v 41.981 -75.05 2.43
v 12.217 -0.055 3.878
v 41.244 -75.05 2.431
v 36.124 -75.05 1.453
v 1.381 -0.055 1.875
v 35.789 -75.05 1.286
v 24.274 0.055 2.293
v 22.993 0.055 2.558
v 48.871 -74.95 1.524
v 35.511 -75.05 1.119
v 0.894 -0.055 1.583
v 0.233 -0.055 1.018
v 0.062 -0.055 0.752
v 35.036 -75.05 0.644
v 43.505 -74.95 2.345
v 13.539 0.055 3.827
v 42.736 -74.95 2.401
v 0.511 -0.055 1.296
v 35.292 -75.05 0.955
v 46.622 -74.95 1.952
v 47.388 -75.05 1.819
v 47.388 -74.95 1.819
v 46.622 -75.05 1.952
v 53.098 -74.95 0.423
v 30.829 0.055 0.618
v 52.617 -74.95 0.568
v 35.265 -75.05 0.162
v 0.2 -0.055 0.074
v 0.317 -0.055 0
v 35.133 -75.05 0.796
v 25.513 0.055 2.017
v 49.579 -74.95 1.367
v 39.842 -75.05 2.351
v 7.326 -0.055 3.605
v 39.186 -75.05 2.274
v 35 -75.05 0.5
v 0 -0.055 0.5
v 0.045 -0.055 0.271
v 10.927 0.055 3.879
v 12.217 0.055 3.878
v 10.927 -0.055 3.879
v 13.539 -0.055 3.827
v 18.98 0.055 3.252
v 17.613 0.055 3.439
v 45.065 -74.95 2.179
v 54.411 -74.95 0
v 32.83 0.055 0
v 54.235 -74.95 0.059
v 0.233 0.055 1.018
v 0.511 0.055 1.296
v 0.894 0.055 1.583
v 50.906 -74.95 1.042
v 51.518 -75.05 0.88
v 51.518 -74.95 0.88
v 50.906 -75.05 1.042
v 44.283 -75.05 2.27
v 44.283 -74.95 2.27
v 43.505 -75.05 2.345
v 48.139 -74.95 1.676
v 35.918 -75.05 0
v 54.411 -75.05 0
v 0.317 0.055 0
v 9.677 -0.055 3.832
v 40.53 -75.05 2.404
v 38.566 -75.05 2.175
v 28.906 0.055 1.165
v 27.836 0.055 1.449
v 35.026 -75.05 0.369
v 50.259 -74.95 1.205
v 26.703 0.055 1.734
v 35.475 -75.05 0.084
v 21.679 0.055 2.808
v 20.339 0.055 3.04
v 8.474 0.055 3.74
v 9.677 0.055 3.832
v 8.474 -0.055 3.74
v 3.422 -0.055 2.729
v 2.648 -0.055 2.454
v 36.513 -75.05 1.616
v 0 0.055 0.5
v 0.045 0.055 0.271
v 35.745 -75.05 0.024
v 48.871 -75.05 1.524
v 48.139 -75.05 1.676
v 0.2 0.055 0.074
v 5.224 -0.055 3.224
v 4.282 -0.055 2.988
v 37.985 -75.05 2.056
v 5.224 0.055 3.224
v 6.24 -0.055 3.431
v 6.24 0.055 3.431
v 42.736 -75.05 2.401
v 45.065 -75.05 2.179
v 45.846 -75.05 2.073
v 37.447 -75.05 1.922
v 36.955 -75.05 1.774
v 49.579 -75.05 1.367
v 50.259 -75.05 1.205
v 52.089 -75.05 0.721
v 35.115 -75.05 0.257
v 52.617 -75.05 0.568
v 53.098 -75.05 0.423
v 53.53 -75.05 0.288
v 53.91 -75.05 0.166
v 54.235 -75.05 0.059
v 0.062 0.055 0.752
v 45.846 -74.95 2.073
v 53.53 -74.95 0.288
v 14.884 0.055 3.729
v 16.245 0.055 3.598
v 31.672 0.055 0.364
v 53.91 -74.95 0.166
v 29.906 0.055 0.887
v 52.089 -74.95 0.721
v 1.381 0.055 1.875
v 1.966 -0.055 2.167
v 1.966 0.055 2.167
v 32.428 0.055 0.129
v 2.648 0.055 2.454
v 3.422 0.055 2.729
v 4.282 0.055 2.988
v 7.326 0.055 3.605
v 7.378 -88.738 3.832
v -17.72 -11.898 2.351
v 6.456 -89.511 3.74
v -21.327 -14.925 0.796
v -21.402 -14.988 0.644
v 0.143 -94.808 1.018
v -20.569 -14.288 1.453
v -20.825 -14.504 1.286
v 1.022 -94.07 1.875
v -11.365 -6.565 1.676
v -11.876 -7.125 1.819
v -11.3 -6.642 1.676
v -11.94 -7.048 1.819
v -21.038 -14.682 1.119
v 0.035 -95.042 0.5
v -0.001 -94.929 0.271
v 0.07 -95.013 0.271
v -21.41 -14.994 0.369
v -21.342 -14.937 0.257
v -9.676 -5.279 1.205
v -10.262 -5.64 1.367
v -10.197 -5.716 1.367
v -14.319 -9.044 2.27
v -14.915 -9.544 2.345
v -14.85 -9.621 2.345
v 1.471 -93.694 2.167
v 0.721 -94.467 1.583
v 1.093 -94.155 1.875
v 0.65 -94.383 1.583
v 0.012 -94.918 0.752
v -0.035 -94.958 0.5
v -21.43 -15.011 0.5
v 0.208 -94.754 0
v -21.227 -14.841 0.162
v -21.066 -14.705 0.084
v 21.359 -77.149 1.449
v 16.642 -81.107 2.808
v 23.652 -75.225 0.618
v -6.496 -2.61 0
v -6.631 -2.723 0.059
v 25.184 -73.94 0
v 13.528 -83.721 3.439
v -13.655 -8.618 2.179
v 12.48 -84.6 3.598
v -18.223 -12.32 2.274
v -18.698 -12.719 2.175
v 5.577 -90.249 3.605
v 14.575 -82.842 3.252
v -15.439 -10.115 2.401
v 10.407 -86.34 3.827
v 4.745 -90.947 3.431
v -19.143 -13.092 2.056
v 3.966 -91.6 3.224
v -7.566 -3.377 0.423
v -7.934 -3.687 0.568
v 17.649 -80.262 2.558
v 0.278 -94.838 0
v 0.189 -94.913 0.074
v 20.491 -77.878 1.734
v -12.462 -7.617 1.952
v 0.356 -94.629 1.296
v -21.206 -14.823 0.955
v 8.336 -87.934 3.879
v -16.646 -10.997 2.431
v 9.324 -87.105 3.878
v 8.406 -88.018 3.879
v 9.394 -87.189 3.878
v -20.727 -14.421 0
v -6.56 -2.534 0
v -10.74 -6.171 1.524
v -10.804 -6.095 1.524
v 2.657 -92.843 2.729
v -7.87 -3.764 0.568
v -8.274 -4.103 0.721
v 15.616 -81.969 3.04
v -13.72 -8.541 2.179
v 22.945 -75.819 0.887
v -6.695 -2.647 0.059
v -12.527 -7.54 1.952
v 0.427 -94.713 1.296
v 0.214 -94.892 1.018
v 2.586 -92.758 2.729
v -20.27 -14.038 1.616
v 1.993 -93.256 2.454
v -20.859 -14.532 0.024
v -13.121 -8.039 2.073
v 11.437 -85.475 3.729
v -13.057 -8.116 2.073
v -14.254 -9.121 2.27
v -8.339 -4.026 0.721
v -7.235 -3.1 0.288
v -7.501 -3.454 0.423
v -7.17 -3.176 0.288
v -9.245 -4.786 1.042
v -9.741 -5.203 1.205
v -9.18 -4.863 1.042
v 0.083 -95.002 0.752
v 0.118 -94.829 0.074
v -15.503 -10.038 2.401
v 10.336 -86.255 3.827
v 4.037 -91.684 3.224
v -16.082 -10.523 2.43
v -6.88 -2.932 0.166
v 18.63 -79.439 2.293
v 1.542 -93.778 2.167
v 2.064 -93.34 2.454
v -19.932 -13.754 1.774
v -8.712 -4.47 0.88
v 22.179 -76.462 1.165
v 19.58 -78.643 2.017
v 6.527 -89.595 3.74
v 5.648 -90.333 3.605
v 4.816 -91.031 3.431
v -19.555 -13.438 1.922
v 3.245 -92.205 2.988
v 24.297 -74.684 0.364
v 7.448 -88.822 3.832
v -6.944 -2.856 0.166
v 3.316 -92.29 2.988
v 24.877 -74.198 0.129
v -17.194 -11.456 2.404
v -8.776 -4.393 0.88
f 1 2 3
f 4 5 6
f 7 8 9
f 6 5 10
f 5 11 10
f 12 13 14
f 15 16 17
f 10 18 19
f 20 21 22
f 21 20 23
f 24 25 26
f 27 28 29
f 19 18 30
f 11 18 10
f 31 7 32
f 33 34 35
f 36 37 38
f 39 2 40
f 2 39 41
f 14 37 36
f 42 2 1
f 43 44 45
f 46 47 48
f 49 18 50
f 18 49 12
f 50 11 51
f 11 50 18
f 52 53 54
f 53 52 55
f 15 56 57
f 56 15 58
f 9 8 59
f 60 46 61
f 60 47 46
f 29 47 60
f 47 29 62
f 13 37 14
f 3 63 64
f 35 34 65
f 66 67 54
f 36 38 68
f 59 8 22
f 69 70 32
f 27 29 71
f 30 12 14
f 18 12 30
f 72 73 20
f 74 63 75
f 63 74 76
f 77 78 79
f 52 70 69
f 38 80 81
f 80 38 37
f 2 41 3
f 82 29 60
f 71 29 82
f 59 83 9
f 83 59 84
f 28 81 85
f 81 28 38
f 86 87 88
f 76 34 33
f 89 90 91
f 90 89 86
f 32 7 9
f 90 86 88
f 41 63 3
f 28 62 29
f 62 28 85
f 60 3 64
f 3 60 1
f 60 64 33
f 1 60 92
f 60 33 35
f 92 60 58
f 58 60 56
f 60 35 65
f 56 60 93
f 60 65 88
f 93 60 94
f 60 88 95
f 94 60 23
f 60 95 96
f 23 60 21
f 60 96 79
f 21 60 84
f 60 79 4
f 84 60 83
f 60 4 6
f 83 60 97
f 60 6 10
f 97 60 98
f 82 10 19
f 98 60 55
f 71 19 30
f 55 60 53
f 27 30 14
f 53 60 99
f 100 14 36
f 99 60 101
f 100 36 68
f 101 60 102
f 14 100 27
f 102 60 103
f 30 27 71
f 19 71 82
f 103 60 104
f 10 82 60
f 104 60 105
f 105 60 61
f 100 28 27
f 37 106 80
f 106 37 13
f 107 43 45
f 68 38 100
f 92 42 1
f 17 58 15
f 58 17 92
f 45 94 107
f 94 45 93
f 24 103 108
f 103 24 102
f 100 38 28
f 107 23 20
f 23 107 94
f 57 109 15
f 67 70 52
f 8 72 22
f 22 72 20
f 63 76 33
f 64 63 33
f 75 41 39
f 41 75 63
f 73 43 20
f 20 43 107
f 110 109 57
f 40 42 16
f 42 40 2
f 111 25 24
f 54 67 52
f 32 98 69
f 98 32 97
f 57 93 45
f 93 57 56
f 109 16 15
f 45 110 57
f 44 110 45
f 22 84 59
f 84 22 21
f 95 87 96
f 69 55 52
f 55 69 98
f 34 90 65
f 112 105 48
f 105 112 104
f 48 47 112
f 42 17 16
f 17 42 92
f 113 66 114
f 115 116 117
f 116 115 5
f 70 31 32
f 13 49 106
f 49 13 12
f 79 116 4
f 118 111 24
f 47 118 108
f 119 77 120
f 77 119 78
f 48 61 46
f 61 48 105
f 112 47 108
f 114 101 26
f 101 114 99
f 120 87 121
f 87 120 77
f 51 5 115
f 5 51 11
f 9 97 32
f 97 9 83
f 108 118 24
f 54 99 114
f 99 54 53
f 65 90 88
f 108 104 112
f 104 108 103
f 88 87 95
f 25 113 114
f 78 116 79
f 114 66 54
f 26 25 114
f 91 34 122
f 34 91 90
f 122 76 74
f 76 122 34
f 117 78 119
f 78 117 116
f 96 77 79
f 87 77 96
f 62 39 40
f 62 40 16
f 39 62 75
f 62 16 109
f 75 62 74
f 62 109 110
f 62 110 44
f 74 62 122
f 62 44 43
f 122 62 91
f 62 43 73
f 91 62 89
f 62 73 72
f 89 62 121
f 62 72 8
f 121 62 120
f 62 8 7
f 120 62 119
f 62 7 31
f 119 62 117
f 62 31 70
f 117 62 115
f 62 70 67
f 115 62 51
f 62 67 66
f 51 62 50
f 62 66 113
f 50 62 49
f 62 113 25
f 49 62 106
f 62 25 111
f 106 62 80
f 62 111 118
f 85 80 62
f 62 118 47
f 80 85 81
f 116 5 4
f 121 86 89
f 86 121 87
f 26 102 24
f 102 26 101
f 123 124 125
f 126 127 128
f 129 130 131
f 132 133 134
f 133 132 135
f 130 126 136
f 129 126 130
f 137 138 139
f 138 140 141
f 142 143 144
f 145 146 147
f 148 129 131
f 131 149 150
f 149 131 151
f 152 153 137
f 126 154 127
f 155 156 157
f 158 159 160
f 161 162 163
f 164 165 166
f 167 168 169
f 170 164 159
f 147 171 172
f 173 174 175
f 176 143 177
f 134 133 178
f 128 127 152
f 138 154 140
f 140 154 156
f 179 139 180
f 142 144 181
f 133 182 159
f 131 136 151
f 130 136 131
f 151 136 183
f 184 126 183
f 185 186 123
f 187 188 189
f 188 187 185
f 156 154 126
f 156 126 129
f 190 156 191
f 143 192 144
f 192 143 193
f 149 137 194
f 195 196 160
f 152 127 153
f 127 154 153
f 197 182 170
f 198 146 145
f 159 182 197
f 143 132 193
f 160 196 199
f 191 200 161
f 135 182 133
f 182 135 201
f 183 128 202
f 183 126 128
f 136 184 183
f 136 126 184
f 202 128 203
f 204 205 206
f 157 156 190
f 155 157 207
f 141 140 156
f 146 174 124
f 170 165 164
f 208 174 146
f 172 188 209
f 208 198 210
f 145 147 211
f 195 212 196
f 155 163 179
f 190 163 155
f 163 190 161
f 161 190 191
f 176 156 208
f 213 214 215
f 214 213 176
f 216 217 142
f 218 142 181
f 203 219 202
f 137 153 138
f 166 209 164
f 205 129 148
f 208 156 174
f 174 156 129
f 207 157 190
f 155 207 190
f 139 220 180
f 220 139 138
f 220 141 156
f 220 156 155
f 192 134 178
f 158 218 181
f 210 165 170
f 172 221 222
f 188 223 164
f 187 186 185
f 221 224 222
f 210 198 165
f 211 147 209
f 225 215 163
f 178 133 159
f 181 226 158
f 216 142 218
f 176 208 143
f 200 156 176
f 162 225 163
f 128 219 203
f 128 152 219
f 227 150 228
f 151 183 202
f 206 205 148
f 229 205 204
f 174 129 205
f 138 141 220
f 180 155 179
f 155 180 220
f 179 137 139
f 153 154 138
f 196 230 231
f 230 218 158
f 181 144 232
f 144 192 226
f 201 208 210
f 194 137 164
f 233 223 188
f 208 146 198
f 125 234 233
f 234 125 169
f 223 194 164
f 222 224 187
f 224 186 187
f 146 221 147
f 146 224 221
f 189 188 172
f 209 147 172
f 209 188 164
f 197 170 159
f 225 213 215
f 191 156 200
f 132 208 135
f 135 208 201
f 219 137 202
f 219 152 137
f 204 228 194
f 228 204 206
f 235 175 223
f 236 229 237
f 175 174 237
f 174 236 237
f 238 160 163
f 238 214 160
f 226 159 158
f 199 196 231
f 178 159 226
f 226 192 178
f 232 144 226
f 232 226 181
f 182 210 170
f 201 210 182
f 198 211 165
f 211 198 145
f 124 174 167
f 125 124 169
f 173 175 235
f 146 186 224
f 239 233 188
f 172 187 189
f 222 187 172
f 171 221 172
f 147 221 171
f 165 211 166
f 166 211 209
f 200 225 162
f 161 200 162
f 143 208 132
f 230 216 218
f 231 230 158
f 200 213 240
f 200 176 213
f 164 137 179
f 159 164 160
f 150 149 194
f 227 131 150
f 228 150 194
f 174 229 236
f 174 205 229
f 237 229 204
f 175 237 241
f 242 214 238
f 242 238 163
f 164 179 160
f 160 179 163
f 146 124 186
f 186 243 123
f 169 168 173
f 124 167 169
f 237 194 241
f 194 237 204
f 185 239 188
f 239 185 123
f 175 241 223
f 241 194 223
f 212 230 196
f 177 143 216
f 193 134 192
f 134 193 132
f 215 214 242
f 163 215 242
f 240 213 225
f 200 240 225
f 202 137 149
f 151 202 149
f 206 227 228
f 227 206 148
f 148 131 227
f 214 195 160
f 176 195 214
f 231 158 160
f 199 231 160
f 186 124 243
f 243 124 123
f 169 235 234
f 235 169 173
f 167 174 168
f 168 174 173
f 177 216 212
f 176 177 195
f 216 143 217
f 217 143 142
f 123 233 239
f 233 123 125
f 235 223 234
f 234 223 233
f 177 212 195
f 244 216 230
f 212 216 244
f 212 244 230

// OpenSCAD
// file: glider.scad
/*
	Openscad glider.

    Copyright (C) Tim Molteno, tim@molteno.net

    
    This program is free software: you can redistribute it and/or modify
    it under the terms of the GNU General Public License as published by
    the Free Software Foundation, either version 3 of the License, or
    (at your option) any later version.

    This program is distributed in the hope that it will be useful,
    but WITHOUT ANY WARRANTY; without even the implied warranty of
    MERCHANTABILITY or FITNESS FOR A PARTICULAR PURPOSE.  See the
    GNU General Public License for more details.

    You should have received a copy of the GNU General Public License
    along with this program.  If not, see <http://www.gnu.org/licenses/>.
*/

/* NACA 5412 Airfoil M=5.0% P=40.0% T=12.0% */

module airfoil(s) {
rotate([0,0,-2]) scale([s,s,s]) polygon(points=[
 [1.000000,-0.000000], [0.998459, 0.000480], [0.993844, 0.001912], [0.986185, 0.004266],
 [0.975528, 0.007497], [0.961940, 0.011541], [0.945503, 0.016321], [0.926320, 0.021747],
 [0.904508, 0.027720], [0.880203, 0.034131], [0.853553, 0.040868], [0.824724, 0.047815],
 [0.793893, 0.054856], [0.761249, 0.061875], [0.726995, 0.068760], [0.691342, 0.075399],
 [0.654508, 0.081690], [0.616723, 0.087531], [0.578217, 0.092831], [0.539230, 0.097504],
 [0.500000, 0.101473], [0.460770, 0.104671], [0.421783, 0.107042], [0.383277, 0.108495],
 [0.345492, 0.108628], [0.308658, 0.107381], [0.273005, 0.104801], [0.238751, 0.100962],
 [0.206107, 0.095964], [0.175276, 0.089926], [0.146447, 0.082992], [0.119797, 0.075318],
 [0.095492, 0.067072], [0.073680, 0.058429], [0.054497, 0.049563], [0.038060, 0.040642],
 [0.024472, 0.031824], [0.013815, 0.023248], [0.006156, 0.015030], [0.001541, 0.007261],
 [0.000000, 0.000000], [0.001541,-0.006492], [0.006156,-0.011976], [0.013815,-0.016460],
 [0.024472,-0.019963], [0.038060,-0.022517], [0.054497,-0.024170], [0.073680,-0.024982],
 [0.095492,-0.025026], [0.119797,-0.024389], [0.146447,-0.023173], [0.175276,-0.021490],
 [0.206107,-0.019460], [0.238751,-0.017213], [0.273005,-0.014881], [0.308658,-0.012596],
 [0.345492,-0.010485], [0.383277,-0.008670], [0.421783,-0.007174], [0.460770,-0.005697],
 [0.500000,-0.004250], [0.539230,-0.002888], [0.578217,-0.001653], [0.616723,-0.000578],
 [0.654508, 0.000317], [0.691342, 0.001023], [0.726995, 0.001539], [0.761249, 0.001875],
 [0.793893, 0.002047], [0.824724, 0.002077], [0.853553, 0.001991], [0.880203, 0.001815],
 [0.904508, 0.001578], [0.926320, 0.001305], [0.945503, 0.001019], [0.961940, 0.000743],
 [0.975528, 0.000494], [0.986185, 0.000286], [0.993844, 0.000130], [0.998459, 0.000033],
 [1.000000, 0.000000]]);
}

/* This is a foil with a flat bottom for easy printing */
module flat_foil(s) {
  difference() {
    translate([0, 0.5]) airfoil(s);
    translate([0,-2]) square([s,2]);
  }
}
	
wingspan = 150;
tail_length = 80;
nose_length = 40;

wing_chord = 35;
wing_z = 4;

module wing_left() {
  rotate([90,0,0]) hull() {
     translate([35,0,wingspan/2]) linear_extrude(height=0.1, center=true) flat_foil(20);
     linear_extrude(height=0.11, center=true) flat_foil(wing_chord);
    }
}

module wing_center() {
  rotate([90,0,0]) hull() {
     translate([0,0,wingspan/2]) linear_extrude(height=1, center=true) flat_foil(wing_chord);
     translate([0,0,-wingspan/2]) linear_extrude(height=1, center=true) flat_foil(wing_chord);
    }
}


module wing_right() {
  mirror([0,1,0]) wing_left();
}


module fuselage() {
  difference() {
    hull() {
      translate([-nose_length,0,5]) rotate([0,90,0]) cylinder(r=6, h=5, $fn=21);
      translate([tail_length+20,0,2]) sphere(r=3, $fn=21);
    }
    translate([0,0,wing_z]) wing_center();
    translate([tail_length,0,0]) stabilizer_vert();
  }
}

module stabilizer_right() {
  hull() {
    cube([20,2,1.5]);
    translate([15, 20, 0]) cylinder(r=6, h=0.6);
  }
}

module stabilizer_left() {
  mirror([0,1,0]) stabilizer_right();
}

module stabilizer_vert() {
  hull() {
    translate([0, -1, 1]) cube([20,2,1]);
    translate([15, 0, 15]) rotate([90,0,0]) cylinder(r=4, h=0.8);
  }
}

/* This is the whole plane, as assembled. To print, you
   must generate a separate .stl for each of these parts
*/
module plane() {
  union() {
    fuselage();
    %translate([0,0,wing_z]) {
      wing_center();
      translate([0, wingspan/2,0]) rotate([10,0,0]) wing_right();
      translate([0, -wingspan/2,0]) rotate([-10,0,0])  wing_left();
    }
    translate([tail_length,0,0]) stabilizer_right();
    translate([tail_length,0,0]) stabilizer_left();
    %translate([tail_length,0,0]) stabilizer_vert();
  }
}

plane();
// main file
/*
	Openscad glider.

    The left and right wing tip

    Copyright (C) Tim Molteno, tim@molteno.net

    
    This program is free software: you can redistribute it and/or modify
    it under the terms of the GNU General Public License as published by
    the Free Software Foundation, either version 3 of the License, or
    (at your option) any later version.

    This program is distributed in the hope that it will be useful,
    but WITHOUT ANY WARRANTY; without even the implied warranty of
    MERCHANTABILITY or FITNESS FOR A PARTICULAR PURPOSE.  See the
    GNU General Public License for more details.

    You should have received a copy of the GNU General Public License
    along with this program.  If not, see <http://www.gnu.org/licenses/>.
*/
use <glider.scad>;

wing_left();
translate([0,-95,0]) rotate([0,0,40]) wing_right(); 
